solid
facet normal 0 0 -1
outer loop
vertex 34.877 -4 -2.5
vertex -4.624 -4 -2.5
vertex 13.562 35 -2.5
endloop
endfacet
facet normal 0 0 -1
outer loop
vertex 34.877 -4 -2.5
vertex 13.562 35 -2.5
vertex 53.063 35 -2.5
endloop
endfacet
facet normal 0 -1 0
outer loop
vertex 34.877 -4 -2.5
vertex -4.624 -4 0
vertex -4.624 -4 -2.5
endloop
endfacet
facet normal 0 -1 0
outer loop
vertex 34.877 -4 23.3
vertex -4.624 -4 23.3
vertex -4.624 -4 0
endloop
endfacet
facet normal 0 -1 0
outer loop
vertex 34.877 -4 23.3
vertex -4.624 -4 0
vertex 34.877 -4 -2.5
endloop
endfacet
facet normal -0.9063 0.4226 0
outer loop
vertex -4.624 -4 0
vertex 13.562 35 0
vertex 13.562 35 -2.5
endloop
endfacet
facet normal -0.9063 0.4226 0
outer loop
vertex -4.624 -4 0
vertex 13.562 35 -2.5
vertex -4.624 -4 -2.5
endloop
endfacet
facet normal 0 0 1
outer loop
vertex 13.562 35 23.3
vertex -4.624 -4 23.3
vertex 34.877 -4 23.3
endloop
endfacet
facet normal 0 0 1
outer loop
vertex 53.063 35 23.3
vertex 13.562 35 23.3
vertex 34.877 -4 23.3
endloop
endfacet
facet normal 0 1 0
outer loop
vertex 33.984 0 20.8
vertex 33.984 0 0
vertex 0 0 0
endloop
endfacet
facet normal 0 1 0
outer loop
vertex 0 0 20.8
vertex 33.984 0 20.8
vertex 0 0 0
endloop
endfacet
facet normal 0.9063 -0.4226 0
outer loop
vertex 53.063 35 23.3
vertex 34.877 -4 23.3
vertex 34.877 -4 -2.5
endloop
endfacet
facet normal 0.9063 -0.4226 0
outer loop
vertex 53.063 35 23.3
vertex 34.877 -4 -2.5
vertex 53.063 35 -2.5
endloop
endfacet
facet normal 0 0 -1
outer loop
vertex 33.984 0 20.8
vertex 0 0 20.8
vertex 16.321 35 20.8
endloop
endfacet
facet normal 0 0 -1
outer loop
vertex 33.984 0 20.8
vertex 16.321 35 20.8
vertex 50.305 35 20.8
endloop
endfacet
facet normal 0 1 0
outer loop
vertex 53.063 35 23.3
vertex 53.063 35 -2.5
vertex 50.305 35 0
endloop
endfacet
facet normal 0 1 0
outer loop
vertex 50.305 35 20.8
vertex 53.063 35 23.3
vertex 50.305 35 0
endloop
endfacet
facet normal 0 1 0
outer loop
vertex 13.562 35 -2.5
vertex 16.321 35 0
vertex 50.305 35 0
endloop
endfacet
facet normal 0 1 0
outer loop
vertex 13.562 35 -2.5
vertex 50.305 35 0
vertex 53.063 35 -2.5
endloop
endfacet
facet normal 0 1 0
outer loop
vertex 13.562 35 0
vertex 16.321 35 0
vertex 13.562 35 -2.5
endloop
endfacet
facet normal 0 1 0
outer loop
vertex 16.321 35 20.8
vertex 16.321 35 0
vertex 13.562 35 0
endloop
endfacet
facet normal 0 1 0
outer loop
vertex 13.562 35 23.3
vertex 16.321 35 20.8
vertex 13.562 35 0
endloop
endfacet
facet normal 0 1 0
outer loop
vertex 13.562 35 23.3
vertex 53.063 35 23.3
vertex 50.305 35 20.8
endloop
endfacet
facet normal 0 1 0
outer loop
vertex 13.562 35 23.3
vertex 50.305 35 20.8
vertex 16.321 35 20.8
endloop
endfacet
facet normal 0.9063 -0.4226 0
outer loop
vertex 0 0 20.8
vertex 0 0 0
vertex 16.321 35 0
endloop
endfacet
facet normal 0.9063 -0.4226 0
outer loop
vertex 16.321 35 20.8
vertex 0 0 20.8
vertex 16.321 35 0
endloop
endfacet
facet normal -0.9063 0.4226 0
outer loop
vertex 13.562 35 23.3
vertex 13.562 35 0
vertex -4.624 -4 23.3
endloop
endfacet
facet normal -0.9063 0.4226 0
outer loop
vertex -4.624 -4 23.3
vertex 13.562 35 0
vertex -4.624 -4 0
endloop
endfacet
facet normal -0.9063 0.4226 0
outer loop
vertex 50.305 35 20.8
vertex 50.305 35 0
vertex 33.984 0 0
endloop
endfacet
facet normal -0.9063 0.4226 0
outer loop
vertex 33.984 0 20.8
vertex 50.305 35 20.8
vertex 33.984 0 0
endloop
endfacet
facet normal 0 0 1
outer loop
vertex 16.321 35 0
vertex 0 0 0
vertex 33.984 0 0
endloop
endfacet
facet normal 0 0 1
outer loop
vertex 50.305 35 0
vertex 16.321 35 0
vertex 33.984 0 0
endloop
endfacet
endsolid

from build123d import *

# Parameters (mm, degrees)
F1_DEPTH = 20.8
F3_DEPTH = 2.5
F4_START = -23.3
F4_DEPTH = 2.5


with BuildPart() as f1:
    # F0 (on Top) → F1 (new body)
    with BuildSketch(Plane.XY):
        Polygon((33.984039904, 0), (0, 0), (16.3207680354, 35), (13.562323238, 35), (-4.62367543, -4), (34.8772540688, -4), (53.0632527369, 35), (50.3048079395, 35), align=None)
    extrude(amount=F1_DEPTH)

    # F2 (on face) → F3 (join)
    with BuildSketch(Plane.XY.offset(20.8)):
        Polygon((50.3048079395, 35), (16.3207680354, 35), (0, 0), (33.984039904, 0), align=None)
        Polygon((16.3207680354, 35), (13.562323238, 35), (-4.62367543, -4), (34.8772540688, -4), (53.0632527369, 35), (50.3048079395, 35), (33.984039904, 0), (0, 0), align=None)
    extrude(amount=F3_DEPTH)

    # F3_face (on face) → F4 (join)
    with BuildSketch(Plane(origin=(24.2197886534, 15.5, 23.3), x_dir=(1, 0, 0), z_dir=(0, 0, 1)).offset(F4_START)):
        Polygon((-10.6574654154, 19.5), (-28.8434640835, -19.5), (10.6574654154, -19.5), (28.8434640835, 19.5), align=None)
    extrude(amount=-F4_DEPTH)


solid = f1.part
